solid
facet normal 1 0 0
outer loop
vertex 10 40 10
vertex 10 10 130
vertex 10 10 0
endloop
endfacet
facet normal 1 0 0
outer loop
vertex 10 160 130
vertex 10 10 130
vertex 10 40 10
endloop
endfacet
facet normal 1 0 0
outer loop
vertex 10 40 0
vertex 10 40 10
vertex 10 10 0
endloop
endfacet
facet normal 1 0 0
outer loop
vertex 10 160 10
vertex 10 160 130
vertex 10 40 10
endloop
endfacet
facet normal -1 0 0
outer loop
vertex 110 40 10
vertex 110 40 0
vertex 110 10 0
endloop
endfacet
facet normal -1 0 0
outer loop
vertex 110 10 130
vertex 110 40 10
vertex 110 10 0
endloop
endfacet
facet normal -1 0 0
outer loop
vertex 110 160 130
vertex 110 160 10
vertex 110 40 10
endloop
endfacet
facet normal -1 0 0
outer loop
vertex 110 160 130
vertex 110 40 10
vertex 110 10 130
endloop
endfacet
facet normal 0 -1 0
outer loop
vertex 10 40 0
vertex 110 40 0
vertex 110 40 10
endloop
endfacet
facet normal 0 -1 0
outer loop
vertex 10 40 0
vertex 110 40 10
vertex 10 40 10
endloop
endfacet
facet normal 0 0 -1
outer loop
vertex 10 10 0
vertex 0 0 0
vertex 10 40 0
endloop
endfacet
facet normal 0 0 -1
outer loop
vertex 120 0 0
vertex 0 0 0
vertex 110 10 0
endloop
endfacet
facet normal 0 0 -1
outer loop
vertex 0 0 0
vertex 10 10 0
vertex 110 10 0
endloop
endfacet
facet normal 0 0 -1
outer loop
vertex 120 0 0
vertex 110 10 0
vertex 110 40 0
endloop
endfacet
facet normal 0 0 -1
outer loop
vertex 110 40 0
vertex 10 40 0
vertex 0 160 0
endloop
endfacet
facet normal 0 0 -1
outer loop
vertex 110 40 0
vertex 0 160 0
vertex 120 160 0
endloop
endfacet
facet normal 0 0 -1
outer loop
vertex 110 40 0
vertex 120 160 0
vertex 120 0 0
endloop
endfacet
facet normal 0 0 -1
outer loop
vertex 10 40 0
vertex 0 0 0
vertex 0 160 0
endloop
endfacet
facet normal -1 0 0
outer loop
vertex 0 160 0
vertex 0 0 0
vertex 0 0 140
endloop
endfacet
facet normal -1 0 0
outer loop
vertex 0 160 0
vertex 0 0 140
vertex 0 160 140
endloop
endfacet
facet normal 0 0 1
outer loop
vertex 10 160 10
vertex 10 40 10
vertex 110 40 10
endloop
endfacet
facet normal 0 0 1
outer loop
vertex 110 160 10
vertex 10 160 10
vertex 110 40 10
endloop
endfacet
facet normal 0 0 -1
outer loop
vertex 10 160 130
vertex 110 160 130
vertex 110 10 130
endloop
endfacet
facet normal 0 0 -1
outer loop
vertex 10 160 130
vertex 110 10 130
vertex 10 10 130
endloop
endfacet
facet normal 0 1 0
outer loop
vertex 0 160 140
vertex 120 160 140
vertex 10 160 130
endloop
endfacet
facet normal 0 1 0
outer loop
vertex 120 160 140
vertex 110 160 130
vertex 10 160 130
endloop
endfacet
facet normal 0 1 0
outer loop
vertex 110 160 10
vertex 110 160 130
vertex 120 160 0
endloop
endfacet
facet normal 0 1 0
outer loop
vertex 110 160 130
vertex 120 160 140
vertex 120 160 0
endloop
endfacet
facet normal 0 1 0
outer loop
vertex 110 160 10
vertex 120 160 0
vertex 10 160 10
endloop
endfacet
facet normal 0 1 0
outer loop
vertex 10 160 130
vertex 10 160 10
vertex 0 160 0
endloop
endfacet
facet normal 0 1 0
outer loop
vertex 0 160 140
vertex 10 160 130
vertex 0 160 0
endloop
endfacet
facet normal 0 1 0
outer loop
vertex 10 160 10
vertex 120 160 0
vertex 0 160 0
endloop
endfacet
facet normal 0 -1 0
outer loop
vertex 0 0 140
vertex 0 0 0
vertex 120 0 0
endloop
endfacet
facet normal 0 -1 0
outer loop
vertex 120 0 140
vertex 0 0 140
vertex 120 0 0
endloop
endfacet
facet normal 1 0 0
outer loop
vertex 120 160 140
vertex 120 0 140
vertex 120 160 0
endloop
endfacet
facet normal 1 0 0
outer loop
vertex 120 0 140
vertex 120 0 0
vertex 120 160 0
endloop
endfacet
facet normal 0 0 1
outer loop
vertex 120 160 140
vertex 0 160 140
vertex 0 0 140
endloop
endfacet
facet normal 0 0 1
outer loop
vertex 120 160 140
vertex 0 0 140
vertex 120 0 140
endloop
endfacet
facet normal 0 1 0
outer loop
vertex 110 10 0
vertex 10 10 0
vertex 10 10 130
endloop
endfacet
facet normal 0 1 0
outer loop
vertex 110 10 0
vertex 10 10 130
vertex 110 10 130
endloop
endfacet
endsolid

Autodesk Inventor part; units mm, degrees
ref_plane "YZ Plane" through (0, 0, 0) normal (1, 0, 0) x (0, 1, 0)
ref_plane "XZ Plane" through (0, 0, 0) normal (0, 1, 0) x (-1, 0, 0)
ref_plane "XY Plane" through (0, 0, 0) normal (0, 0, 1) x (1, 0, 0)
sketch "Skizze1" plane through (0, 0, 0) normal (0, 0, 1) x (1, 0, 0)
  line L0 (-24, 0) -> (144, 0) projected
  line L1 (0, -32) -> (0, 192) projected
  line L2 (0, 0) -> (120, 0)
  line L3 (120, 0) -> (120, 160)
  line L4 (120, 160) -> (0, 160)
  line L5 (0, 160) -> (0, 0)
  point P0 (0, 160)
  dimension "d0" = 120
  dimension "d1" = 160
extrude "Extrusion1" add sketch "Skizze1" along normal blind 140
sketch "Skizze2" plane through (0, 0, 0) normal (0, 0, -1) x (-1, 0, 0)
  line L0 (-10, 10) -> (-110, 10)
  line L1 (-110, 10) -> (-110, 40)
  line L2 (-110, 40) -> (-10, 40)
  line L3 (-10, 40) -> (-10, 10)
  line L4 (0, 0) -> (-120, 0) projected
  line L5 (0, 160) -> (0, 0) projected
  line L6 (-120, 0) -> (-120, 160) projected
  dimension "d4" = 10
  dimension "d5" = 10
  dimension "d6" = 10
  dimension "d7" = 30
extrude "Extrusion2" cut sketch "Skizze2" against normal blind 130
sketch "Skizze3" plane through (0, 160, 0) normal (0, 1, 0) x (1, 0, 0)
  line L0 (110, -130) -> (10, -130)
  line L1 (10, -130) -> (10, -10)
  line L2 (10, -10) -> (110, -10)
  line L3 (110, -10) -> (110, -130)
  line L4 (120, -140) -> (0, -140) projected
  line L5 (0, 0) -> (0, -140) projected
  line L6 (120, 0) -> (120, -140) projected
  line L7 (120, 0) -> (0, 0) projected
  dimension "d10" = 10
  dimension "d11" = 10
  dimension "d12" = 10
  dimension "d13" = 10
extrude "Extrusion3" cut sketch "Skizze3" against normal blind 130 contours L0 L1 L2 L3
properties part number "EierkocherTeil2" material "Acetalharz, Schwarz"
